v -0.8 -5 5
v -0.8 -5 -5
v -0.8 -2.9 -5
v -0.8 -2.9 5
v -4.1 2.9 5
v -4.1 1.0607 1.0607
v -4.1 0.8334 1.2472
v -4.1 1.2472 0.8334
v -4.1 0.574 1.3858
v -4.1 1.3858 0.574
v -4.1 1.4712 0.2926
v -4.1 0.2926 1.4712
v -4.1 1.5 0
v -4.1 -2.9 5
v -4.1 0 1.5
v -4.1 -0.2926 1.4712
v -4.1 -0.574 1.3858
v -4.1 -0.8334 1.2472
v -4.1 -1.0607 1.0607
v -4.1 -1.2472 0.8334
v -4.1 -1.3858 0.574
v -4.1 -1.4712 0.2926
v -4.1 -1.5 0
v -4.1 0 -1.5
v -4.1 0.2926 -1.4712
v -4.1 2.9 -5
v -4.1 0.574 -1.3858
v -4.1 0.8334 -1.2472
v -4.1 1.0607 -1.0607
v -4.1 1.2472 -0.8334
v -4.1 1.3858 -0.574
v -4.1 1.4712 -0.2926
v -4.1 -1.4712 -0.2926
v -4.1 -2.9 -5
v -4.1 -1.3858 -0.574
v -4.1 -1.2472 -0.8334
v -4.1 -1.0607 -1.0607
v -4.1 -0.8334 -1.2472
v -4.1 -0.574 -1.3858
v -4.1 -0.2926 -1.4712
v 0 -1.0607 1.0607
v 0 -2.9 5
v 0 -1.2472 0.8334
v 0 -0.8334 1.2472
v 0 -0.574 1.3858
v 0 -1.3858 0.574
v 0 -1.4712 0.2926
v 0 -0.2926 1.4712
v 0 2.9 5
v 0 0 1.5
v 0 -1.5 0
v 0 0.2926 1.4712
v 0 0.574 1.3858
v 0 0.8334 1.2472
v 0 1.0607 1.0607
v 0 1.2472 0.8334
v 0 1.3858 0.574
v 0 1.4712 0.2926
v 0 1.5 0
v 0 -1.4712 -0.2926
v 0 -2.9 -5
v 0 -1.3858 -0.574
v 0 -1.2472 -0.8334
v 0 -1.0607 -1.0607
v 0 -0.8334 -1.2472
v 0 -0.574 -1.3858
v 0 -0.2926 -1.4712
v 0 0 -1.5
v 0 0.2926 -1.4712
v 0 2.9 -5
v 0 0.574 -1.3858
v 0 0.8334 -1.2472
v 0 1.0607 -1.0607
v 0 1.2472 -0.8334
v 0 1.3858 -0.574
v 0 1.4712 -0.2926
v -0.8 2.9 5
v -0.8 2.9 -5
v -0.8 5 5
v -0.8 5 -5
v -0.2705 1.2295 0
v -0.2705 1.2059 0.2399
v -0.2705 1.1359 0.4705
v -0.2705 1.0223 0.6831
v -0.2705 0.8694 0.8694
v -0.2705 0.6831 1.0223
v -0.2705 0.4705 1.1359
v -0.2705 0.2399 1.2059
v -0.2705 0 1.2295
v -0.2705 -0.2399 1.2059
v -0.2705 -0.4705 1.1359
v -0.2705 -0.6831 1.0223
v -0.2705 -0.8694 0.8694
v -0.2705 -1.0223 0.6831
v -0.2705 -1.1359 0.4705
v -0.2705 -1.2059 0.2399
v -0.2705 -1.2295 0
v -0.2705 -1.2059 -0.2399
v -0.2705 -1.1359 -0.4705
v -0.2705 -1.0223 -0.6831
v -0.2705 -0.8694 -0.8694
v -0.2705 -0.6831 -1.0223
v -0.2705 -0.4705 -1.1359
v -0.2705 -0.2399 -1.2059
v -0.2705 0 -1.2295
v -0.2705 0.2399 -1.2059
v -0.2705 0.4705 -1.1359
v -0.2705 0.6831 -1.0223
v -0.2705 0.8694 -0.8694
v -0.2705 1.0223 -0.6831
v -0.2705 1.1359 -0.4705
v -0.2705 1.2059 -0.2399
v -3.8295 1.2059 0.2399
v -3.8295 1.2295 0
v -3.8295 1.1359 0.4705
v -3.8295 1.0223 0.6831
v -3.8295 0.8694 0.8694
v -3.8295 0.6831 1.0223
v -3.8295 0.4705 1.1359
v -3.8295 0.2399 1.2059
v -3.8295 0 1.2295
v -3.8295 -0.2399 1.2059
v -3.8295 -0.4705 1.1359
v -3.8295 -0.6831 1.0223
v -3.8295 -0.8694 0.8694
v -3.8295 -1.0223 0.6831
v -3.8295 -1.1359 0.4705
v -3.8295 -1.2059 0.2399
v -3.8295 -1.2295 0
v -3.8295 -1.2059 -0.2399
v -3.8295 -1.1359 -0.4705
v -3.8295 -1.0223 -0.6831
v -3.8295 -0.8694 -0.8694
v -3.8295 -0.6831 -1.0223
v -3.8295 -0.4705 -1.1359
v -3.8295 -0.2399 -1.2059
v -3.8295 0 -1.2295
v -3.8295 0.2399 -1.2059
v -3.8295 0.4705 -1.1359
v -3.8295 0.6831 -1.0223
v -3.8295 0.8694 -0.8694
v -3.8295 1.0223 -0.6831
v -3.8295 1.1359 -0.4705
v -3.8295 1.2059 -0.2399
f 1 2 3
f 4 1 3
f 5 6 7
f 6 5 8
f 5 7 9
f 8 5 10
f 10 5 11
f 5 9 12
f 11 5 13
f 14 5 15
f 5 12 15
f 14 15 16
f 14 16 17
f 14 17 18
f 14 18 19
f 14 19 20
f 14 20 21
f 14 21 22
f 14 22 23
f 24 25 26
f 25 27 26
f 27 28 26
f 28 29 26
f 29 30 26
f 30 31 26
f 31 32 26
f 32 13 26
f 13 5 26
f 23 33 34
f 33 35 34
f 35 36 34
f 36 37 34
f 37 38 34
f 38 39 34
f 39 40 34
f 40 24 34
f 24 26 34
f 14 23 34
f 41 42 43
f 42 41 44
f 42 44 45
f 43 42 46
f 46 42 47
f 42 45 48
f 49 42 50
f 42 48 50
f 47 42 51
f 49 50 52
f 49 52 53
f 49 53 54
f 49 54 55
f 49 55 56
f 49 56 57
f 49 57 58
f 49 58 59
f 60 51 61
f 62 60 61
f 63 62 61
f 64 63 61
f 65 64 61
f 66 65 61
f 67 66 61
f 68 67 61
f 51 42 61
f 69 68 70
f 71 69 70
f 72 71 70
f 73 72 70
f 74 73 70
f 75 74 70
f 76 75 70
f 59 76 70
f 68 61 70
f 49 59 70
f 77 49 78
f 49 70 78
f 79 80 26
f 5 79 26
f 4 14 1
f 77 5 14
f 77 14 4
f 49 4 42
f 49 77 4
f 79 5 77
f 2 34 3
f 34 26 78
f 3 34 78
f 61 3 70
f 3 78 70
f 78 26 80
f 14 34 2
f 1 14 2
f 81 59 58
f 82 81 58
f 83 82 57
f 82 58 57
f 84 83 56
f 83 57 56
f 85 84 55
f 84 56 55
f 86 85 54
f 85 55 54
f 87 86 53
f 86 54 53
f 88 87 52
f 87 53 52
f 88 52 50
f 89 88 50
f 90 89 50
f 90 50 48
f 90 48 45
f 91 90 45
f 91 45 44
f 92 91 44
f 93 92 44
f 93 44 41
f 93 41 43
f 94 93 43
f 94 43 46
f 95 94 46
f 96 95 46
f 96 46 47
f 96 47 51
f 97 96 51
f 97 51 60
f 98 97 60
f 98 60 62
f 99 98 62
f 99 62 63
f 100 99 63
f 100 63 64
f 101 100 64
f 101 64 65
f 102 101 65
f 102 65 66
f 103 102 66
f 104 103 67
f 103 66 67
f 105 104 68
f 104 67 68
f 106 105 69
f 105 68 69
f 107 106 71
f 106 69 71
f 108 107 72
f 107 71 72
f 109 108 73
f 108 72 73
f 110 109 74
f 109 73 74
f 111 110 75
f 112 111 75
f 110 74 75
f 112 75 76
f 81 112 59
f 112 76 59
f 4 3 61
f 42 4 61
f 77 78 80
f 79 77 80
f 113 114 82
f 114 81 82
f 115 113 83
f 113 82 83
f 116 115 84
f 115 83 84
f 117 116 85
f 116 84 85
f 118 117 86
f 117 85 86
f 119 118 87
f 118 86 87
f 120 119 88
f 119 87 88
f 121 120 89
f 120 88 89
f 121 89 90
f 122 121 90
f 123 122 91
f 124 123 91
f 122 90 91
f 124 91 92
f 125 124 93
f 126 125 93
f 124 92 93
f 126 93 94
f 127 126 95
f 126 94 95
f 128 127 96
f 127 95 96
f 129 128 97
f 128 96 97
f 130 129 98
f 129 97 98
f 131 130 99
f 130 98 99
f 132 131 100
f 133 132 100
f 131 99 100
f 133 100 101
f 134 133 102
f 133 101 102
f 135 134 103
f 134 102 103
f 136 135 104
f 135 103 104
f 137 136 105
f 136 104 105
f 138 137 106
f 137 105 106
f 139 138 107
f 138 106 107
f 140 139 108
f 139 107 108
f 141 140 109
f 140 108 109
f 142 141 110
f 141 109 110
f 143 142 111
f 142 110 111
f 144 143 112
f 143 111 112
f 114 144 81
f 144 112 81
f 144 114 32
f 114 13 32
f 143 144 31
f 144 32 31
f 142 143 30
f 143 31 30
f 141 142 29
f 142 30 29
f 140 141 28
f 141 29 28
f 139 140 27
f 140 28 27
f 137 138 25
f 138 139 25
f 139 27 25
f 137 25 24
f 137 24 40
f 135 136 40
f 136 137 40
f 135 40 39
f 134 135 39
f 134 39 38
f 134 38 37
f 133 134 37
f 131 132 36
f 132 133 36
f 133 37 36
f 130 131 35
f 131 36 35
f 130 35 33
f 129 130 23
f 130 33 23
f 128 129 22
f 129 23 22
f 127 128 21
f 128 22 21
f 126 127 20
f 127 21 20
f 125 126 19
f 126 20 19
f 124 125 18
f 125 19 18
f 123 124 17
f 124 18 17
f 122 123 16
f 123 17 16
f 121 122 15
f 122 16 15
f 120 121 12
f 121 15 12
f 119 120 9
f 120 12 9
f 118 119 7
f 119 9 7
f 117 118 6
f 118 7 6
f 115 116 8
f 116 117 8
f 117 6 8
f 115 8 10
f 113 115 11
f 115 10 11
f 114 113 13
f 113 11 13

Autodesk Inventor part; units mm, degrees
sketch "Sketch_4" plane through (0, 0, 0) normal (0, 0, 1) x (1, 0, 0)
  line L0 (-4.1, 2.9) -> (-4.1, -2.9)
  line L1 (-4.1, -2.9) -> (-0.8, -5)
  line L2 (-0.8, -5) -> (-0.8, -2.9)
  line L3 (-0.8, -2.9) -> (0, -2.9)
  line L4 (0, -2.9) -> (0, 2.9)
  line L5 (0, 2.9) -> (-0.8, 2.9)
  line L6 (-0.8, 2.9) -> (-0.8, 5)
  line L7 (-0.8, 5) -> (-4.1, 2.9)
extrude "Extrusion1" add sketch "Sketch_4" along normal mid plane 10
sketch "Sketch_5" plane through (0, 0, 0) normal (0, 0, 1) x (1, 0, 0)
  line L0 (0, 0) -> (-4.1, 0)
  line L1 (-4.1, 0) -> (-4.1, 1.5)
  line L2 (-4.1, 1.5) -> (-3.8295, 1.2295)
  line L3 (-3.8295, 1.2295) -> (-0.2705, 1.2295)
  line L4 (-0.2705, 1.2295) -> (0, 1.5)
  line L5 (0, 1.5) -> (0, 0)
  line L6 (0, 0) -> (-4.1, 0)
revolve "Revolution1" cut sketch "Sketch_5" angle 360 about axis through (0, 0, 0) along (1, 0, 0)
thread "Thread1" size "M3x0.5" class "6H" standard "ISO Metric profile" full length
ref_plane "nut_XY" through (0, 0, 0) normal (1, 0, 0) x (0, 0, -1)
ref_plane "nut_YZ" through (0, 0, 0) normal (0, 0, -1) x (0, 1, 0)
ref_plane "nut_ZX" through (0, 0, 0) normal (0, 1, 0) x (1, 0, 0)
ref_plane "to_bolt_XY" through (-4.1, 0, 0) normal (1, 0, 0) x (0, 0, -1)
ref_plane "to_bolt_YZ" through (-4.1, 0, 0) normal (0, 0, -1) x (0, 1, 0)
ref_plane "to_bolt_ZX" through (-4.1, 0, 0) normal (0, 1, 0) x (1, 0, 0)
ref_plane "to_frames_XY" through (-0.8, 0, 0) normal (1, 0, 0) x (0, 0, -1)
ref_plane "to_frames_YZ" through (-0.8, 0, 0) normal (0, 0, -1) x (0, 1, 0)
ref_plane "to_frames_ZX" through (-0.8, 0, 0) normal (0, 1, 0) x (1, 0, 0)
properties part number "HNTT5-3_1"
